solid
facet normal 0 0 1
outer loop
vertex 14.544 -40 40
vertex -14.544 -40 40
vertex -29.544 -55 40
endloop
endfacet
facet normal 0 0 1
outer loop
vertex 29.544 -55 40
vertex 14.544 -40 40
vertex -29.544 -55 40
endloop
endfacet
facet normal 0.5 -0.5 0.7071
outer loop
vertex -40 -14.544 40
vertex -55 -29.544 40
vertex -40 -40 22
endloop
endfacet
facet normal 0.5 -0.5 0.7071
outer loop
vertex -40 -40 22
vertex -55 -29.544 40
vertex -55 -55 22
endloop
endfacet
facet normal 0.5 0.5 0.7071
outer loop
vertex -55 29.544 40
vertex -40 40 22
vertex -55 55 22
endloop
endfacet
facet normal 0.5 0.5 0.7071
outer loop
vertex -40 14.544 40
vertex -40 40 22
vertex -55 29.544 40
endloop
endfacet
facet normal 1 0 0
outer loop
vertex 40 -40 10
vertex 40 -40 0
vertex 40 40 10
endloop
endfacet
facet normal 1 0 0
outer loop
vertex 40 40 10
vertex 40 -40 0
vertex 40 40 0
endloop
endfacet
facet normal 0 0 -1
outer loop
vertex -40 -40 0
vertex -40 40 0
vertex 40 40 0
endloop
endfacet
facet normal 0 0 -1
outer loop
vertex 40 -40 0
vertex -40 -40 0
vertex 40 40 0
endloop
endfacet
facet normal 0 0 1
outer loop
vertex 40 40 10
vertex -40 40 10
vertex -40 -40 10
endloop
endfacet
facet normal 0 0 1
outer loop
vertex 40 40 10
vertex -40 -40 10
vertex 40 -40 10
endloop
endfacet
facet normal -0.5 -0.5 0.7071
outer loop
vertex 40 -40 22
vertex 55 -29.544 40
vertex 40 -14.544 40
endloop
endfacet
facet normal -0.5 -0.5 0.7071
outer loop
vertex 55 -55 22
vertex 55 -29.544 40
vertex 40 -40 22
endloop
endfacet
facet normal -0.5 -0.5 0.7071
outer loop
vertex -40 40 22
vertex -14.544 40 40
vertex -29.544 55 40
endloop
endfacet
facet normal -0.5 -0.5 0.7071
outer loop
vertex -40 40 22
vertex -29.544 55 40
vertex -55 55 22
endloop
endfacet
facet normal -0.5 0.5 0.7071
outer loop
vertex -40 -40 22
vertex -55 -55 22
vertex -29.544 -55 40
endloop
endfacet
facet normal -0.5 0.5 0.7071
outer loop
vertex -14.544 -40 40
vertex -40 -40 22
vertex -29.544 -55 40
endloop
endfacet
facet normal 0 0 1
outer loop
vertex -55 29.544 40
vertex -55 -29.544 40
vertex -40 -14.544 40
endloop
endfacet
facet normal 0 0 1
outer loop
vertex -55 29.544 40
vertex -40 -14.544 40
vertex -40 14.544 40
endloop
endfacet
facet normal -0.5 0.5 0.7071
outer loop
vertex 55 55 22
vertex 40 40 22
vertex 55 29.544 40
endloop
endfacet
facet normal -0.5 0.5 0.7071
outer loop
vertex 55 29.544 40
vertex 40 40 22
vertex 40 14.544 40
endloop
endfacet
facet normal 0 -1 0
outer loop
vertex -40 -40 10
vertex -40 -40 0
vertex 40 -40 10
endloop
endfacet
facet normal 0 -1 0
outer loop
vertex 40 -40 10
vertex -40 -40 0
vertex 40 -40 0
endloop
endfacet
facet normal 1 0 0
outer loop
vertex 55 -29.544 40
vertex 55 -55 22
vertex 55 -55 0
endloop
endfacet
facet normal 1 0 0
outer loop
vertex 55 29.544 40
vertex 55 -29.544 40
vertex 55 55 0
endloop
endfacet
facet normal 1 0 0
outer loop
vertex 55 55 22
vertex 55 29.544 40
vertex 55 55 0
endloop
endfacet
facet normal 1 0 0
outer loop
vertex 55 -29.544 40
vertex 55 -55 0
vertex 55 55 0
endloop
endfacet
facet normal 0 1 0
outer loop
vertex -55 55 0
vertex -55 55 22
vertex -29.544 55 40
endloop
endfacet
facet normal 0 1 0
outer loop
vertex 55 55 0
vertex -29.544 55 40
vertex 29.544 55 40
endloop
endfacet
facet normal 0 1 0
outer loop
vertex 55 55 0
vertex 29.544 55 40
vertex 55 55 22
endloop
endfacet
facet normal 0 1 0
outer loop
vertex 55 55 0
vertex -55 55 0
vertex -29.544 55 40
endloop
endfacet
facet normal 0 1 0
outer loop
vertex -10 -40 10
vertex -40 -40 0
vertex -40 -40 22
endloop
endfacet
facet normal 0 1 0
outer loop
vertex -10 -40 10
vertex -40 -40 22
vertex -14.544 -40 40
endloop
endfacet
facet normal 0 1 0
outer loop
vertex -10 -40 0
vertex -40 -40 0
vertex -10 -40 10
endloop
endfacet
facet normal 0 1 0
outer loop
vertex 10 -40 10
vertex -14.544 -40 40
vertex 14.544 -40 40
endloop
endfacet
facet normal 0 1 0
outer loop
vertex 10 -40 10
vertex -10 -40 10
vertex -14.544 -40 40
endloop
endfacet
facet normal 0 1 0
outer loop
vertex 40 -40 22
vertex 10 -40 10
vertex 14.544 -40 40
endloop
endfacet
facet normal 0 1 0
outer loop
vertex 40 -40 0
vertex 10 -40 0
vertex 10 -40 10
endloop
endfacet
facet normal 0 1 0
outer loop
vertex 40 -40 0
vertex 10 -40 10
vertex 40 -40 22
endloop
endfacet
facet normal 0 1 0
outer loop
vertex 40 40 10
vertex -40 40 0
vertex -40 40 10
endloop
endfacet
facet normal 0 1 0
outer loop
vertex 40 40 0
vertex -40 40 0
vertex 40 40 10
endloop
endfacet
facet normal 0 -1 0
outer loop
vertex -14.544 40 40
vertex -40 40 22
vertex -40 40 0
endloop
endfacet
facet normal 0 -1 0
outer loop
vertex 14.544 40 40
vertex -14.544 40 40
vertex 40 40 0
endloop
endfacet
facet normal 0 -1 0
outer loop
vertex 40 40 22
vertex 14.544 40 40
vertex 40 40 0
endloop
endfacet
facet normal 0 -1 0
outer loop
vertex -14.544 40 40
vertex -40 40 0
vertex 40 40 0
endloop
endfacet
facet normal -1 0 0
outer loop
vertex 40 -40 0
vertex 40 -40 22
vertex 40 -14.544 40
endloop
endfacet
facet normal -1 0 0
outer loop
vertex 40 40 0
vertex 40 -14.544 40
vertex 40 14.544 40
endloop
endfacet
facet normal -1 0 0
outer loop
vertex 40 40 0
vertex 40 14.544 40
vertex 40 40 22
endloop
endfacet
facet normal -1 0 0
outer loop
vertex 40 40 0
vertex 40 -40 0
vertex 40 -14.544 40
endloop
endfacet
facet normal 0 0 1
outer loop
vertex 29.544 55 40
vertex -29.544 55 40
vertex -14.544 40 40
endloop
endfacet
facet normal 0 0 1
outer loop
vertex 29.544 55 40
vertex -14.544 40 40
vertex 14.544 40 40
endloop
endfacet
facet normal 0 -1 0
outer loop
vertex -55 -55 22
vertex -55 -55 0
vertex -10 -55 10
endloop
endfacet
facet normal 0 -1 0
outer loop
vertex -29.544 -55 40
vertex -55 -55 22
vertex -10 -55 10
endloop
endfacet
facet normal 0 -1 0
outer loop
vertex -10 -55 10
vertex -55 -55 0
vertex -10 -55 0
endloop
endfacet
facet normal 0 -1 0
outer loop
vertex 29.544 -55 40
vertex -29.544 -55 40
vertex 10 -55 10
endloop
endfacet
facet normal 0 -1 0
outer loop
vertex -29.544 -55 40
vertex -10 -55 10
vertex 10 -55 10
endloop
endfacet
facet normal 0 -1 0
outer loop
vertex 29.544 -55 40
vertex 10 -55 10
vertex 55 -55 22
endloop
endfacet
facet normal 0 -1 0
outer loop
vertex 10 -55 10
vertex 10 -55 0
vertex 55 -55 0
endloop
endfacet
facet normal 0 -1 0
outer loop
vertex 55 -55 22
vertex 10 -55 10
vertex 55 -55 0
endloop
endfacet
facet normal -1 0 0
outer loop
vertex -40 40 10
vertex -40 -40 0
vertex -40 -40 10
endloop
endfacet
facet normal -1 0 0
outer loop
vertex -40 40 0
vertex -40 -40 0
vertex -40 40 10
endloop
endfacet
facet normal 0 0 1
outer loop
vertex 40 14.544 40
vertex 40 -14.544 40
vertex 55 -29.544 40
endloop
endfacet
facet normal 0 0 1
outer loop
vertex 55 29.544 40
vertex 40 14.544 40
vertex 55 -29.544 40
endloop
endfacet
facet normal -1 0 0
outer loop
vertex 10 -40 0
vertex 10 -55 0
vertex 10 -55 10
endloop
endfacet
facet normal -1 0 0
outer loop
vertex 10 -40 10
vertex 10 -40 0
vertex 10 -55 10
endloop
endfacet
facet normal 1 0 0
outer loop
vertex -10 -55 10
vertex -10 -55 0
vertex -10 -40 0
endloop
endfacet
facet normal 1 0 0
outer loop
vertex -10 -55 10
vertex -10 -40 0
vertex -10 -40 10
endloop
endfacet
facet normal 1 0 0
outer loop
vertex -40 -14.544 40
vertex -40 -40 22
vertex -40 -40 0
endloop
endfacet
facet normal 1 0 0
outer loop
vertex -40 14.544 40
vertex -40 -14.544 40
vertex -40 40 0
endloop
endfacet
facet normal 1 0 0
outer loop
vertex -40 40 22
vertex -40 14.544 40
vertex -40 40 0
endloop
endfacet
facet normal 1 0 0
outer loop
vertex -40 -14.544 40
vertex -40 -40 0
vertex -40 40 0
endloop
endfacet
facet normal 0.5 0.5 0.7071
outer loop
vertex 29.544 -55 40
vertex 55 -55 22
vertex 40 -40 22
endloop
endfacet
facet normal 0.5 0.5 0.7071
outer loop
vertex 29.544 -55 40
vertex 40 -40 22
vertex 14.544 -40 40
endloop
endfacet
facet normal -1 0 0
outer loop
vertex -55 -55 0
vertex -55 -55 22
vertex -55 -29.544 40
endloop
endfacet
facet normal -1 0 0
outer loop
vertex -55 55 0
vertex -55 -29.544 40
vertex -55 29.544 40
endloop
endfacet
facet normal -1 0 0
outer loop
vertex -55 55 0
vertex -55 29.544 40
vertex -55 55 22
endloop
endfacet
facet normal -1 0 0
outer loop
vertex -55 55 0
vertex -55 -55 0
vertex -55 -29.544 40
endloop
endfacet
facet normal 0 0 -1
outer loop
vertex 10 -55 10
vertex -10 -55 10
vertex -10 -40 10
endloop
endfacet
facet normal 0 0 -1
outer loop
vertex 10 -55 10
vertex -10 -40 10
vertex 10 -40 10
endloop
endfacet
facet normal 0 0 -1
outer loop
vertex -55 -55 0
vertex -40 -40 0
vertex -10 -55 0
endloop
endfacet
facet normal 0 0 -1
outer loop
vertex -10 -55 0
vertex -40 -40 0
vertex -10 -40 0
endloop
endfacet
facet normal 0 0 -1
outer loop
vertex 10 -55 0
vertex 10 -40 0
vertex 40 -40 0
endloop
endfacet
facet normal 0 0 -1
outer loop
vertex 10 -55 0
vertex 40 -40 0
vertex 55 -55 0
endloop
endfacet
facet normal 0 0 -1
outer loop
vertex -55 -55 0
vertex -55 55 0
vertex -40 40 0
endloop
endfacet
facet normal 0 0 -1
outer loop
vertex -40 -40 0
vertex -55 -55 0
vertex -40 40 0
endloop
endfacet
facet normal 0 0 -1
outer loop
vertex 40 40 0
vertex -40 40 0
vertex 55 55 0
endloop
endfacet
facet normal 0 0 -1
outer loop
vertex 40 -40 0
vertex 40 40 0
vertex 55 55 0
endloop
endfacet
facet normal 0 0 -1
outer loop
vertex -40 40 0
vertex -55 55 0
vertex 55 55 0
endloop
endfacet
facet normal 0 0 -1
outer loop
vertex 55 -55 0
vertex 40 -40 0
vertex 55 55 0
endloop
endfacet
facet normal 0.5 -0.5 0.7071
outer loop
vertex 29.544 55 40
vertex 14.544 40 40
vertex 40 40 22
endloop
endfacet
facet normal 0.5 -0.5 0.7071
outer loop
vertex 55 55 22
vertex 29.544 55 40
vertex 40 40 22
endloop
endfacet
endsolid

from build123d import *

# Parameters (mm, degrees)
F0_W     = 110
F0_H     = 110
F0_W_2   = 80
F0_H_2   = 80
F1_DEPTH = 40
F0_W_3   = 70
F0_H_3   = 70
F2_DEPTH = 10
F5_DEPTH = 200
F6_W     = 20
F6_H     = 20
F7_DEPTH = 25


# Not quite as in the source:
# - a pattern or mirror of a feature is missing from the dataset's text; its kind, count and spacing are read off the source's solid


with BuildPart() as f1:
    # F0 (on Top) → F1 (new body)
    with BuildSketch(Plane.XY):
        Rectangle(F0_W, F0_H)
        Rectangle(F0_W_2, F0_H_2, mode=Mode.SUBTRACT)
    extrude(amount=F1_DEPTH)

    # F4 (on face) → F5 (cut)
    with BuildSketch(Plane(origin=(55, -55, 0), x_dir=(-0.7071067812, -0.7071067812, 0), z_dir=(-0.7071067812, 0.7071067812, 0))):
        Polygon((-18, 40), (0, 22), (0, 40), align=None)
        Polygon((0, 40), (0, 22), (18, 40), align=None)
    f5 = extrude(amount=F5_DEPTH, mode=Mode.SUBTRACT)

    # F5_copies: F5 across plane
    add(f5.mirror(Plane(origin=(0, 0, 0), x_dir=(0, 0, 1), z_dir=(1, 0, 0))), mode=Mode.SUBTRACT)

    # F6 (on face) → F7 (cut)
    with BuildSketch(Plane.XZ.offset(55)):
        Rectangle(F6_W, F6_H)
    extrude(amount=-F7_DEPTH, mode=Mode.SUBTRACT)


with BuildPart() as f2:
    # F0 (on Top) → F2 (new body)
    with BuildSketch(Plane.XY):
        Rectangle(F0_W_2, F0_H_2)
        Rectangle(F0_W_3, F0_H_3, mode=Mode.SUBTRACT)
        Rectangle(F0_W_3, F0_H_3)
    extrude(amount=F2_DEPTH)


solid = Compound([f1.part, f2.part])
